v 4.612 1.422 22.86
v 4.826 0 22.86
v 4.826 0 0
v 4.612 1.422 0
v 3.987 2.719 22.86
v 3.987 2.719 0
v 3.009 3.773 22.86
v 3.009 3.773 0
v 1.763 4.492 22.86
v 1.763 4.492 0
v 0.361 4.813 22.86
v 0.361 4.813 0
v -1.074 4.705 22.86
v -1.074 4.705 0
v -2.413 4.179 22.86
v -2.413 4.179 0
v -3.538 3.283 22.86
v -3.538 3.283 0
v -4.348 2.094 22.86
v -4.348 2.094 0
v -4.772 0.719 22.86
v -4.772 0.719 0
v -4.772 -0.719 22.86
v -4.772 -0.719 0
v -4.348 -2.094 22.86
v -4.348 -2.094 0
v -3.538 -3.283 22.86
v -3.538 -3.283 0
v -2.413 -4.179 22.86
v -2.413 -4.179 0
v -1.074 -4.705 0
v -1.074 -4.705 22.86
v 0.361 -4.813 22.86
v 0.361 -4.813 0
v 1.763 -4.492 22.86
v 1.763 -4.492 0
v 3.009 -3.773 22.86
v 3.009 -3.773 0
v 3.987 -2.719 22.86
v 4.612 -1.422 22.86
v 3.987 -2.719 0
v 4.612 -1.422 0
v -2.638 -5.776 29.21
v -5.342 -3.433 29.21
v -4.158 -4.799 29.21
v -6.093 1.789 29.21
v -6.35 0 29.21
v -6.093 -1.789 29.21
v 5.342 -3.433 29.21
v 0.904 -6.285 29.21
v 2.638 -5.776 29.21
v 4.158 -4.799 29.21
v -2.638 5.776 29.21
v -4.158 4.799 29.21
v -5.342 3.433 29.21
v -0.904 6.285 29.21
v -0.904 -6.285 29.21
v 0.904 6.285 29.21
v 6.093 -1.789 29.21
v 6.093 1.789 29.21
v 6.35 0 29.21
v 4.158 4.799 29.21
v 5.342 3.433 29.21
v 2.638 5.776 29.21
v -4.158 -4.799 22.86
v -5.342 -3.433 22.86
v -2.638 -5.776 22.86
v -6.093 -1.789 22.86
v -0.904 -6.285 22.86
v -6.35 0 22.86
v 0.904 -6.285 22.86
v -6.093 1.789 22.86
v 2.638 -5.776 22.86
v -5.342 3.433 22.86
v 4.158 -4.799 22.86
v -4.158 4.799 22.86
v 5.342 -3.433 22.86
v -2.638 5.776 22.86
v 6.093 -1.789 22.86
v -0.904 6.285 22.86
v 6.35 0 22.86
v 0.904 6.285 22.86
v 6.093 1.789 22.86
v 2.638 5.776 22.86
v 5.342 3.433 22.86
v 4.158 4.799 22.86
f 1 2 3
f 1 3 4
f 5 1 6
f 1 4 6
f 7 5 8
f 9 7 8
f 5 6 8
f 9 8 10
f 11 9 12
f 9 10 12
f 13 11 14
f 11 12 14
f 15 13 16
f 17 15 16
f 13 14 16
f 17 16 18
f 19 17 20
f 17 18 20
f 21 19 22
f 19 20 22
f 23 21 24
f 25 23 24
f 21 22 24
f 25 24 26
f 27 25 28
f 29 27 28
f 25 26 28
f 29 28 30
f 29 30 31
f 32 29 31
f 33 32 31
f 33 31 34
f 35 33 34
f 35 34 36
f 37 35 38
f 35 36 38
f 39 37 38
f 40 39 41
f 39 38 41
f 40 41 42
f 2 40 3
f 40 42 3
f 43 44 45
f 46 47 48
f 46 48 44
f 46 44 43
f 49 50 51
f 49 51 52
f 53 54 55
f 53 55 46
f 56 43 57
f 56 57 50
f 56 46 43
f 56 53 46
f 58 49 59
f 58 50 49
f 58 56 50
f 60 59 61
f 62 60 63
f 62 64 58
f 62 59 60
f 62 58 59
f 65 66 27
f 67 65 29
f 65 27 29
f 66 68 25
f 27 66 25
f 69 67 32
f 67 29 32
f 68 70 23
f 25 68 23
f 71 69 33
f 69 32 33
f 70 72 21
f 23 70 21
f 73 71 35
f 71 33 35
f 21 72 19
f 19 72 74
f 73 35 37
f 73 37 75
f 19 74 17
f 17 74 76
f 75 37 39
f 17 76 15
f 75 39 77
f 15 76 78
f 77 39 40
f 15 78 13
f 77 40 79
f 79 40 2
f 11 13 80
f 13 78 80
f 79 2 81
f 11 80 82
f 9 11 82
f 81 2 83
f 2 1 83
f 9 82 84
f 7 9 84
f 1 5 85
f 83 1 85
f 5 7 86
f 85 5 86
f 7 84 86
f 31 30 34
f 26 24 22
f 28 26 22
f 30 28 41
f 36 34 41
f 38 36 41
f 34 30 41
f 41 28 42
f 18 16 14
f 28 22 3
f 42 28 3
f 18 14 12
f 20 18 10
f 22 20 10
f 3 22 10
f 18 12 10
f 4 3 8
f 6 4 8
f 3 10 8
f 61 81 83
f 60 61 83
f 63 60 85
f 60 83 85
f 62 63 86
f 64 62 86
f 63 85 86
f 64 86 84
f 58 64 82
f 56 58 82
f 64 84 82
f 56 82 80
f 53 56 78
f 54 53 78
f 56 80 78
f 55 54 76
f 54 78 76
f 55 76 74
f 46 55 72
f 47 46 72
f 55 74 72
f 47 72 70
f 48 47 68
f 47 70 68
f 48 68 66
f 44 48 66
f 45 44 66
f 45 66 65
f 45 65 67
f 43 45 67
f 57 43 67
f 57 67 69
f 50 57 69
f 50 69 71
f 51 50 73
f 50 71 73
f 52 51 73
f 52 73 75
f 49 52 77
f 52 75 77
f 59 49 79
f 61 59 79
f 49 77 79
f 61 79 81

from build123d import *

# Parameters (mm, degrees)
F0_R     = 4.826
F1_DEPTH = 22.86
F2_R     = 6.35
F2_R_2   = 4.826
F3_DEPTH = 6.35
F4_DEPTH = 6.35


# Not quite as in the source:
# - a feature names something its author has since deleted; it is built from what else it names


with BuildPart() as f1:
    # F0 (on Top) → F1 (new body)
    with BuildSketch(Plane.XY):
        Circle(F0_R)
    extrude(amount=F1_DEPTH)

    # F2 (on face) → F3 (join)
    with BuildSketch(Plane.XY.offset(22.86)):
        Circle(F2_R)
        Circle(F2_R_2, mode=Mode.SUBTRACT)
    extrude(amount=F3_DEPTH)

    # F4 (add): a face of the model
    f4_faces = [f1.faces().sort_by_distance(p)[0] for p in [
        (0, 0, 22.86),
    ]]
    extrude(f4_faces, amount=F4_DEPTH)


solid = f1.part
